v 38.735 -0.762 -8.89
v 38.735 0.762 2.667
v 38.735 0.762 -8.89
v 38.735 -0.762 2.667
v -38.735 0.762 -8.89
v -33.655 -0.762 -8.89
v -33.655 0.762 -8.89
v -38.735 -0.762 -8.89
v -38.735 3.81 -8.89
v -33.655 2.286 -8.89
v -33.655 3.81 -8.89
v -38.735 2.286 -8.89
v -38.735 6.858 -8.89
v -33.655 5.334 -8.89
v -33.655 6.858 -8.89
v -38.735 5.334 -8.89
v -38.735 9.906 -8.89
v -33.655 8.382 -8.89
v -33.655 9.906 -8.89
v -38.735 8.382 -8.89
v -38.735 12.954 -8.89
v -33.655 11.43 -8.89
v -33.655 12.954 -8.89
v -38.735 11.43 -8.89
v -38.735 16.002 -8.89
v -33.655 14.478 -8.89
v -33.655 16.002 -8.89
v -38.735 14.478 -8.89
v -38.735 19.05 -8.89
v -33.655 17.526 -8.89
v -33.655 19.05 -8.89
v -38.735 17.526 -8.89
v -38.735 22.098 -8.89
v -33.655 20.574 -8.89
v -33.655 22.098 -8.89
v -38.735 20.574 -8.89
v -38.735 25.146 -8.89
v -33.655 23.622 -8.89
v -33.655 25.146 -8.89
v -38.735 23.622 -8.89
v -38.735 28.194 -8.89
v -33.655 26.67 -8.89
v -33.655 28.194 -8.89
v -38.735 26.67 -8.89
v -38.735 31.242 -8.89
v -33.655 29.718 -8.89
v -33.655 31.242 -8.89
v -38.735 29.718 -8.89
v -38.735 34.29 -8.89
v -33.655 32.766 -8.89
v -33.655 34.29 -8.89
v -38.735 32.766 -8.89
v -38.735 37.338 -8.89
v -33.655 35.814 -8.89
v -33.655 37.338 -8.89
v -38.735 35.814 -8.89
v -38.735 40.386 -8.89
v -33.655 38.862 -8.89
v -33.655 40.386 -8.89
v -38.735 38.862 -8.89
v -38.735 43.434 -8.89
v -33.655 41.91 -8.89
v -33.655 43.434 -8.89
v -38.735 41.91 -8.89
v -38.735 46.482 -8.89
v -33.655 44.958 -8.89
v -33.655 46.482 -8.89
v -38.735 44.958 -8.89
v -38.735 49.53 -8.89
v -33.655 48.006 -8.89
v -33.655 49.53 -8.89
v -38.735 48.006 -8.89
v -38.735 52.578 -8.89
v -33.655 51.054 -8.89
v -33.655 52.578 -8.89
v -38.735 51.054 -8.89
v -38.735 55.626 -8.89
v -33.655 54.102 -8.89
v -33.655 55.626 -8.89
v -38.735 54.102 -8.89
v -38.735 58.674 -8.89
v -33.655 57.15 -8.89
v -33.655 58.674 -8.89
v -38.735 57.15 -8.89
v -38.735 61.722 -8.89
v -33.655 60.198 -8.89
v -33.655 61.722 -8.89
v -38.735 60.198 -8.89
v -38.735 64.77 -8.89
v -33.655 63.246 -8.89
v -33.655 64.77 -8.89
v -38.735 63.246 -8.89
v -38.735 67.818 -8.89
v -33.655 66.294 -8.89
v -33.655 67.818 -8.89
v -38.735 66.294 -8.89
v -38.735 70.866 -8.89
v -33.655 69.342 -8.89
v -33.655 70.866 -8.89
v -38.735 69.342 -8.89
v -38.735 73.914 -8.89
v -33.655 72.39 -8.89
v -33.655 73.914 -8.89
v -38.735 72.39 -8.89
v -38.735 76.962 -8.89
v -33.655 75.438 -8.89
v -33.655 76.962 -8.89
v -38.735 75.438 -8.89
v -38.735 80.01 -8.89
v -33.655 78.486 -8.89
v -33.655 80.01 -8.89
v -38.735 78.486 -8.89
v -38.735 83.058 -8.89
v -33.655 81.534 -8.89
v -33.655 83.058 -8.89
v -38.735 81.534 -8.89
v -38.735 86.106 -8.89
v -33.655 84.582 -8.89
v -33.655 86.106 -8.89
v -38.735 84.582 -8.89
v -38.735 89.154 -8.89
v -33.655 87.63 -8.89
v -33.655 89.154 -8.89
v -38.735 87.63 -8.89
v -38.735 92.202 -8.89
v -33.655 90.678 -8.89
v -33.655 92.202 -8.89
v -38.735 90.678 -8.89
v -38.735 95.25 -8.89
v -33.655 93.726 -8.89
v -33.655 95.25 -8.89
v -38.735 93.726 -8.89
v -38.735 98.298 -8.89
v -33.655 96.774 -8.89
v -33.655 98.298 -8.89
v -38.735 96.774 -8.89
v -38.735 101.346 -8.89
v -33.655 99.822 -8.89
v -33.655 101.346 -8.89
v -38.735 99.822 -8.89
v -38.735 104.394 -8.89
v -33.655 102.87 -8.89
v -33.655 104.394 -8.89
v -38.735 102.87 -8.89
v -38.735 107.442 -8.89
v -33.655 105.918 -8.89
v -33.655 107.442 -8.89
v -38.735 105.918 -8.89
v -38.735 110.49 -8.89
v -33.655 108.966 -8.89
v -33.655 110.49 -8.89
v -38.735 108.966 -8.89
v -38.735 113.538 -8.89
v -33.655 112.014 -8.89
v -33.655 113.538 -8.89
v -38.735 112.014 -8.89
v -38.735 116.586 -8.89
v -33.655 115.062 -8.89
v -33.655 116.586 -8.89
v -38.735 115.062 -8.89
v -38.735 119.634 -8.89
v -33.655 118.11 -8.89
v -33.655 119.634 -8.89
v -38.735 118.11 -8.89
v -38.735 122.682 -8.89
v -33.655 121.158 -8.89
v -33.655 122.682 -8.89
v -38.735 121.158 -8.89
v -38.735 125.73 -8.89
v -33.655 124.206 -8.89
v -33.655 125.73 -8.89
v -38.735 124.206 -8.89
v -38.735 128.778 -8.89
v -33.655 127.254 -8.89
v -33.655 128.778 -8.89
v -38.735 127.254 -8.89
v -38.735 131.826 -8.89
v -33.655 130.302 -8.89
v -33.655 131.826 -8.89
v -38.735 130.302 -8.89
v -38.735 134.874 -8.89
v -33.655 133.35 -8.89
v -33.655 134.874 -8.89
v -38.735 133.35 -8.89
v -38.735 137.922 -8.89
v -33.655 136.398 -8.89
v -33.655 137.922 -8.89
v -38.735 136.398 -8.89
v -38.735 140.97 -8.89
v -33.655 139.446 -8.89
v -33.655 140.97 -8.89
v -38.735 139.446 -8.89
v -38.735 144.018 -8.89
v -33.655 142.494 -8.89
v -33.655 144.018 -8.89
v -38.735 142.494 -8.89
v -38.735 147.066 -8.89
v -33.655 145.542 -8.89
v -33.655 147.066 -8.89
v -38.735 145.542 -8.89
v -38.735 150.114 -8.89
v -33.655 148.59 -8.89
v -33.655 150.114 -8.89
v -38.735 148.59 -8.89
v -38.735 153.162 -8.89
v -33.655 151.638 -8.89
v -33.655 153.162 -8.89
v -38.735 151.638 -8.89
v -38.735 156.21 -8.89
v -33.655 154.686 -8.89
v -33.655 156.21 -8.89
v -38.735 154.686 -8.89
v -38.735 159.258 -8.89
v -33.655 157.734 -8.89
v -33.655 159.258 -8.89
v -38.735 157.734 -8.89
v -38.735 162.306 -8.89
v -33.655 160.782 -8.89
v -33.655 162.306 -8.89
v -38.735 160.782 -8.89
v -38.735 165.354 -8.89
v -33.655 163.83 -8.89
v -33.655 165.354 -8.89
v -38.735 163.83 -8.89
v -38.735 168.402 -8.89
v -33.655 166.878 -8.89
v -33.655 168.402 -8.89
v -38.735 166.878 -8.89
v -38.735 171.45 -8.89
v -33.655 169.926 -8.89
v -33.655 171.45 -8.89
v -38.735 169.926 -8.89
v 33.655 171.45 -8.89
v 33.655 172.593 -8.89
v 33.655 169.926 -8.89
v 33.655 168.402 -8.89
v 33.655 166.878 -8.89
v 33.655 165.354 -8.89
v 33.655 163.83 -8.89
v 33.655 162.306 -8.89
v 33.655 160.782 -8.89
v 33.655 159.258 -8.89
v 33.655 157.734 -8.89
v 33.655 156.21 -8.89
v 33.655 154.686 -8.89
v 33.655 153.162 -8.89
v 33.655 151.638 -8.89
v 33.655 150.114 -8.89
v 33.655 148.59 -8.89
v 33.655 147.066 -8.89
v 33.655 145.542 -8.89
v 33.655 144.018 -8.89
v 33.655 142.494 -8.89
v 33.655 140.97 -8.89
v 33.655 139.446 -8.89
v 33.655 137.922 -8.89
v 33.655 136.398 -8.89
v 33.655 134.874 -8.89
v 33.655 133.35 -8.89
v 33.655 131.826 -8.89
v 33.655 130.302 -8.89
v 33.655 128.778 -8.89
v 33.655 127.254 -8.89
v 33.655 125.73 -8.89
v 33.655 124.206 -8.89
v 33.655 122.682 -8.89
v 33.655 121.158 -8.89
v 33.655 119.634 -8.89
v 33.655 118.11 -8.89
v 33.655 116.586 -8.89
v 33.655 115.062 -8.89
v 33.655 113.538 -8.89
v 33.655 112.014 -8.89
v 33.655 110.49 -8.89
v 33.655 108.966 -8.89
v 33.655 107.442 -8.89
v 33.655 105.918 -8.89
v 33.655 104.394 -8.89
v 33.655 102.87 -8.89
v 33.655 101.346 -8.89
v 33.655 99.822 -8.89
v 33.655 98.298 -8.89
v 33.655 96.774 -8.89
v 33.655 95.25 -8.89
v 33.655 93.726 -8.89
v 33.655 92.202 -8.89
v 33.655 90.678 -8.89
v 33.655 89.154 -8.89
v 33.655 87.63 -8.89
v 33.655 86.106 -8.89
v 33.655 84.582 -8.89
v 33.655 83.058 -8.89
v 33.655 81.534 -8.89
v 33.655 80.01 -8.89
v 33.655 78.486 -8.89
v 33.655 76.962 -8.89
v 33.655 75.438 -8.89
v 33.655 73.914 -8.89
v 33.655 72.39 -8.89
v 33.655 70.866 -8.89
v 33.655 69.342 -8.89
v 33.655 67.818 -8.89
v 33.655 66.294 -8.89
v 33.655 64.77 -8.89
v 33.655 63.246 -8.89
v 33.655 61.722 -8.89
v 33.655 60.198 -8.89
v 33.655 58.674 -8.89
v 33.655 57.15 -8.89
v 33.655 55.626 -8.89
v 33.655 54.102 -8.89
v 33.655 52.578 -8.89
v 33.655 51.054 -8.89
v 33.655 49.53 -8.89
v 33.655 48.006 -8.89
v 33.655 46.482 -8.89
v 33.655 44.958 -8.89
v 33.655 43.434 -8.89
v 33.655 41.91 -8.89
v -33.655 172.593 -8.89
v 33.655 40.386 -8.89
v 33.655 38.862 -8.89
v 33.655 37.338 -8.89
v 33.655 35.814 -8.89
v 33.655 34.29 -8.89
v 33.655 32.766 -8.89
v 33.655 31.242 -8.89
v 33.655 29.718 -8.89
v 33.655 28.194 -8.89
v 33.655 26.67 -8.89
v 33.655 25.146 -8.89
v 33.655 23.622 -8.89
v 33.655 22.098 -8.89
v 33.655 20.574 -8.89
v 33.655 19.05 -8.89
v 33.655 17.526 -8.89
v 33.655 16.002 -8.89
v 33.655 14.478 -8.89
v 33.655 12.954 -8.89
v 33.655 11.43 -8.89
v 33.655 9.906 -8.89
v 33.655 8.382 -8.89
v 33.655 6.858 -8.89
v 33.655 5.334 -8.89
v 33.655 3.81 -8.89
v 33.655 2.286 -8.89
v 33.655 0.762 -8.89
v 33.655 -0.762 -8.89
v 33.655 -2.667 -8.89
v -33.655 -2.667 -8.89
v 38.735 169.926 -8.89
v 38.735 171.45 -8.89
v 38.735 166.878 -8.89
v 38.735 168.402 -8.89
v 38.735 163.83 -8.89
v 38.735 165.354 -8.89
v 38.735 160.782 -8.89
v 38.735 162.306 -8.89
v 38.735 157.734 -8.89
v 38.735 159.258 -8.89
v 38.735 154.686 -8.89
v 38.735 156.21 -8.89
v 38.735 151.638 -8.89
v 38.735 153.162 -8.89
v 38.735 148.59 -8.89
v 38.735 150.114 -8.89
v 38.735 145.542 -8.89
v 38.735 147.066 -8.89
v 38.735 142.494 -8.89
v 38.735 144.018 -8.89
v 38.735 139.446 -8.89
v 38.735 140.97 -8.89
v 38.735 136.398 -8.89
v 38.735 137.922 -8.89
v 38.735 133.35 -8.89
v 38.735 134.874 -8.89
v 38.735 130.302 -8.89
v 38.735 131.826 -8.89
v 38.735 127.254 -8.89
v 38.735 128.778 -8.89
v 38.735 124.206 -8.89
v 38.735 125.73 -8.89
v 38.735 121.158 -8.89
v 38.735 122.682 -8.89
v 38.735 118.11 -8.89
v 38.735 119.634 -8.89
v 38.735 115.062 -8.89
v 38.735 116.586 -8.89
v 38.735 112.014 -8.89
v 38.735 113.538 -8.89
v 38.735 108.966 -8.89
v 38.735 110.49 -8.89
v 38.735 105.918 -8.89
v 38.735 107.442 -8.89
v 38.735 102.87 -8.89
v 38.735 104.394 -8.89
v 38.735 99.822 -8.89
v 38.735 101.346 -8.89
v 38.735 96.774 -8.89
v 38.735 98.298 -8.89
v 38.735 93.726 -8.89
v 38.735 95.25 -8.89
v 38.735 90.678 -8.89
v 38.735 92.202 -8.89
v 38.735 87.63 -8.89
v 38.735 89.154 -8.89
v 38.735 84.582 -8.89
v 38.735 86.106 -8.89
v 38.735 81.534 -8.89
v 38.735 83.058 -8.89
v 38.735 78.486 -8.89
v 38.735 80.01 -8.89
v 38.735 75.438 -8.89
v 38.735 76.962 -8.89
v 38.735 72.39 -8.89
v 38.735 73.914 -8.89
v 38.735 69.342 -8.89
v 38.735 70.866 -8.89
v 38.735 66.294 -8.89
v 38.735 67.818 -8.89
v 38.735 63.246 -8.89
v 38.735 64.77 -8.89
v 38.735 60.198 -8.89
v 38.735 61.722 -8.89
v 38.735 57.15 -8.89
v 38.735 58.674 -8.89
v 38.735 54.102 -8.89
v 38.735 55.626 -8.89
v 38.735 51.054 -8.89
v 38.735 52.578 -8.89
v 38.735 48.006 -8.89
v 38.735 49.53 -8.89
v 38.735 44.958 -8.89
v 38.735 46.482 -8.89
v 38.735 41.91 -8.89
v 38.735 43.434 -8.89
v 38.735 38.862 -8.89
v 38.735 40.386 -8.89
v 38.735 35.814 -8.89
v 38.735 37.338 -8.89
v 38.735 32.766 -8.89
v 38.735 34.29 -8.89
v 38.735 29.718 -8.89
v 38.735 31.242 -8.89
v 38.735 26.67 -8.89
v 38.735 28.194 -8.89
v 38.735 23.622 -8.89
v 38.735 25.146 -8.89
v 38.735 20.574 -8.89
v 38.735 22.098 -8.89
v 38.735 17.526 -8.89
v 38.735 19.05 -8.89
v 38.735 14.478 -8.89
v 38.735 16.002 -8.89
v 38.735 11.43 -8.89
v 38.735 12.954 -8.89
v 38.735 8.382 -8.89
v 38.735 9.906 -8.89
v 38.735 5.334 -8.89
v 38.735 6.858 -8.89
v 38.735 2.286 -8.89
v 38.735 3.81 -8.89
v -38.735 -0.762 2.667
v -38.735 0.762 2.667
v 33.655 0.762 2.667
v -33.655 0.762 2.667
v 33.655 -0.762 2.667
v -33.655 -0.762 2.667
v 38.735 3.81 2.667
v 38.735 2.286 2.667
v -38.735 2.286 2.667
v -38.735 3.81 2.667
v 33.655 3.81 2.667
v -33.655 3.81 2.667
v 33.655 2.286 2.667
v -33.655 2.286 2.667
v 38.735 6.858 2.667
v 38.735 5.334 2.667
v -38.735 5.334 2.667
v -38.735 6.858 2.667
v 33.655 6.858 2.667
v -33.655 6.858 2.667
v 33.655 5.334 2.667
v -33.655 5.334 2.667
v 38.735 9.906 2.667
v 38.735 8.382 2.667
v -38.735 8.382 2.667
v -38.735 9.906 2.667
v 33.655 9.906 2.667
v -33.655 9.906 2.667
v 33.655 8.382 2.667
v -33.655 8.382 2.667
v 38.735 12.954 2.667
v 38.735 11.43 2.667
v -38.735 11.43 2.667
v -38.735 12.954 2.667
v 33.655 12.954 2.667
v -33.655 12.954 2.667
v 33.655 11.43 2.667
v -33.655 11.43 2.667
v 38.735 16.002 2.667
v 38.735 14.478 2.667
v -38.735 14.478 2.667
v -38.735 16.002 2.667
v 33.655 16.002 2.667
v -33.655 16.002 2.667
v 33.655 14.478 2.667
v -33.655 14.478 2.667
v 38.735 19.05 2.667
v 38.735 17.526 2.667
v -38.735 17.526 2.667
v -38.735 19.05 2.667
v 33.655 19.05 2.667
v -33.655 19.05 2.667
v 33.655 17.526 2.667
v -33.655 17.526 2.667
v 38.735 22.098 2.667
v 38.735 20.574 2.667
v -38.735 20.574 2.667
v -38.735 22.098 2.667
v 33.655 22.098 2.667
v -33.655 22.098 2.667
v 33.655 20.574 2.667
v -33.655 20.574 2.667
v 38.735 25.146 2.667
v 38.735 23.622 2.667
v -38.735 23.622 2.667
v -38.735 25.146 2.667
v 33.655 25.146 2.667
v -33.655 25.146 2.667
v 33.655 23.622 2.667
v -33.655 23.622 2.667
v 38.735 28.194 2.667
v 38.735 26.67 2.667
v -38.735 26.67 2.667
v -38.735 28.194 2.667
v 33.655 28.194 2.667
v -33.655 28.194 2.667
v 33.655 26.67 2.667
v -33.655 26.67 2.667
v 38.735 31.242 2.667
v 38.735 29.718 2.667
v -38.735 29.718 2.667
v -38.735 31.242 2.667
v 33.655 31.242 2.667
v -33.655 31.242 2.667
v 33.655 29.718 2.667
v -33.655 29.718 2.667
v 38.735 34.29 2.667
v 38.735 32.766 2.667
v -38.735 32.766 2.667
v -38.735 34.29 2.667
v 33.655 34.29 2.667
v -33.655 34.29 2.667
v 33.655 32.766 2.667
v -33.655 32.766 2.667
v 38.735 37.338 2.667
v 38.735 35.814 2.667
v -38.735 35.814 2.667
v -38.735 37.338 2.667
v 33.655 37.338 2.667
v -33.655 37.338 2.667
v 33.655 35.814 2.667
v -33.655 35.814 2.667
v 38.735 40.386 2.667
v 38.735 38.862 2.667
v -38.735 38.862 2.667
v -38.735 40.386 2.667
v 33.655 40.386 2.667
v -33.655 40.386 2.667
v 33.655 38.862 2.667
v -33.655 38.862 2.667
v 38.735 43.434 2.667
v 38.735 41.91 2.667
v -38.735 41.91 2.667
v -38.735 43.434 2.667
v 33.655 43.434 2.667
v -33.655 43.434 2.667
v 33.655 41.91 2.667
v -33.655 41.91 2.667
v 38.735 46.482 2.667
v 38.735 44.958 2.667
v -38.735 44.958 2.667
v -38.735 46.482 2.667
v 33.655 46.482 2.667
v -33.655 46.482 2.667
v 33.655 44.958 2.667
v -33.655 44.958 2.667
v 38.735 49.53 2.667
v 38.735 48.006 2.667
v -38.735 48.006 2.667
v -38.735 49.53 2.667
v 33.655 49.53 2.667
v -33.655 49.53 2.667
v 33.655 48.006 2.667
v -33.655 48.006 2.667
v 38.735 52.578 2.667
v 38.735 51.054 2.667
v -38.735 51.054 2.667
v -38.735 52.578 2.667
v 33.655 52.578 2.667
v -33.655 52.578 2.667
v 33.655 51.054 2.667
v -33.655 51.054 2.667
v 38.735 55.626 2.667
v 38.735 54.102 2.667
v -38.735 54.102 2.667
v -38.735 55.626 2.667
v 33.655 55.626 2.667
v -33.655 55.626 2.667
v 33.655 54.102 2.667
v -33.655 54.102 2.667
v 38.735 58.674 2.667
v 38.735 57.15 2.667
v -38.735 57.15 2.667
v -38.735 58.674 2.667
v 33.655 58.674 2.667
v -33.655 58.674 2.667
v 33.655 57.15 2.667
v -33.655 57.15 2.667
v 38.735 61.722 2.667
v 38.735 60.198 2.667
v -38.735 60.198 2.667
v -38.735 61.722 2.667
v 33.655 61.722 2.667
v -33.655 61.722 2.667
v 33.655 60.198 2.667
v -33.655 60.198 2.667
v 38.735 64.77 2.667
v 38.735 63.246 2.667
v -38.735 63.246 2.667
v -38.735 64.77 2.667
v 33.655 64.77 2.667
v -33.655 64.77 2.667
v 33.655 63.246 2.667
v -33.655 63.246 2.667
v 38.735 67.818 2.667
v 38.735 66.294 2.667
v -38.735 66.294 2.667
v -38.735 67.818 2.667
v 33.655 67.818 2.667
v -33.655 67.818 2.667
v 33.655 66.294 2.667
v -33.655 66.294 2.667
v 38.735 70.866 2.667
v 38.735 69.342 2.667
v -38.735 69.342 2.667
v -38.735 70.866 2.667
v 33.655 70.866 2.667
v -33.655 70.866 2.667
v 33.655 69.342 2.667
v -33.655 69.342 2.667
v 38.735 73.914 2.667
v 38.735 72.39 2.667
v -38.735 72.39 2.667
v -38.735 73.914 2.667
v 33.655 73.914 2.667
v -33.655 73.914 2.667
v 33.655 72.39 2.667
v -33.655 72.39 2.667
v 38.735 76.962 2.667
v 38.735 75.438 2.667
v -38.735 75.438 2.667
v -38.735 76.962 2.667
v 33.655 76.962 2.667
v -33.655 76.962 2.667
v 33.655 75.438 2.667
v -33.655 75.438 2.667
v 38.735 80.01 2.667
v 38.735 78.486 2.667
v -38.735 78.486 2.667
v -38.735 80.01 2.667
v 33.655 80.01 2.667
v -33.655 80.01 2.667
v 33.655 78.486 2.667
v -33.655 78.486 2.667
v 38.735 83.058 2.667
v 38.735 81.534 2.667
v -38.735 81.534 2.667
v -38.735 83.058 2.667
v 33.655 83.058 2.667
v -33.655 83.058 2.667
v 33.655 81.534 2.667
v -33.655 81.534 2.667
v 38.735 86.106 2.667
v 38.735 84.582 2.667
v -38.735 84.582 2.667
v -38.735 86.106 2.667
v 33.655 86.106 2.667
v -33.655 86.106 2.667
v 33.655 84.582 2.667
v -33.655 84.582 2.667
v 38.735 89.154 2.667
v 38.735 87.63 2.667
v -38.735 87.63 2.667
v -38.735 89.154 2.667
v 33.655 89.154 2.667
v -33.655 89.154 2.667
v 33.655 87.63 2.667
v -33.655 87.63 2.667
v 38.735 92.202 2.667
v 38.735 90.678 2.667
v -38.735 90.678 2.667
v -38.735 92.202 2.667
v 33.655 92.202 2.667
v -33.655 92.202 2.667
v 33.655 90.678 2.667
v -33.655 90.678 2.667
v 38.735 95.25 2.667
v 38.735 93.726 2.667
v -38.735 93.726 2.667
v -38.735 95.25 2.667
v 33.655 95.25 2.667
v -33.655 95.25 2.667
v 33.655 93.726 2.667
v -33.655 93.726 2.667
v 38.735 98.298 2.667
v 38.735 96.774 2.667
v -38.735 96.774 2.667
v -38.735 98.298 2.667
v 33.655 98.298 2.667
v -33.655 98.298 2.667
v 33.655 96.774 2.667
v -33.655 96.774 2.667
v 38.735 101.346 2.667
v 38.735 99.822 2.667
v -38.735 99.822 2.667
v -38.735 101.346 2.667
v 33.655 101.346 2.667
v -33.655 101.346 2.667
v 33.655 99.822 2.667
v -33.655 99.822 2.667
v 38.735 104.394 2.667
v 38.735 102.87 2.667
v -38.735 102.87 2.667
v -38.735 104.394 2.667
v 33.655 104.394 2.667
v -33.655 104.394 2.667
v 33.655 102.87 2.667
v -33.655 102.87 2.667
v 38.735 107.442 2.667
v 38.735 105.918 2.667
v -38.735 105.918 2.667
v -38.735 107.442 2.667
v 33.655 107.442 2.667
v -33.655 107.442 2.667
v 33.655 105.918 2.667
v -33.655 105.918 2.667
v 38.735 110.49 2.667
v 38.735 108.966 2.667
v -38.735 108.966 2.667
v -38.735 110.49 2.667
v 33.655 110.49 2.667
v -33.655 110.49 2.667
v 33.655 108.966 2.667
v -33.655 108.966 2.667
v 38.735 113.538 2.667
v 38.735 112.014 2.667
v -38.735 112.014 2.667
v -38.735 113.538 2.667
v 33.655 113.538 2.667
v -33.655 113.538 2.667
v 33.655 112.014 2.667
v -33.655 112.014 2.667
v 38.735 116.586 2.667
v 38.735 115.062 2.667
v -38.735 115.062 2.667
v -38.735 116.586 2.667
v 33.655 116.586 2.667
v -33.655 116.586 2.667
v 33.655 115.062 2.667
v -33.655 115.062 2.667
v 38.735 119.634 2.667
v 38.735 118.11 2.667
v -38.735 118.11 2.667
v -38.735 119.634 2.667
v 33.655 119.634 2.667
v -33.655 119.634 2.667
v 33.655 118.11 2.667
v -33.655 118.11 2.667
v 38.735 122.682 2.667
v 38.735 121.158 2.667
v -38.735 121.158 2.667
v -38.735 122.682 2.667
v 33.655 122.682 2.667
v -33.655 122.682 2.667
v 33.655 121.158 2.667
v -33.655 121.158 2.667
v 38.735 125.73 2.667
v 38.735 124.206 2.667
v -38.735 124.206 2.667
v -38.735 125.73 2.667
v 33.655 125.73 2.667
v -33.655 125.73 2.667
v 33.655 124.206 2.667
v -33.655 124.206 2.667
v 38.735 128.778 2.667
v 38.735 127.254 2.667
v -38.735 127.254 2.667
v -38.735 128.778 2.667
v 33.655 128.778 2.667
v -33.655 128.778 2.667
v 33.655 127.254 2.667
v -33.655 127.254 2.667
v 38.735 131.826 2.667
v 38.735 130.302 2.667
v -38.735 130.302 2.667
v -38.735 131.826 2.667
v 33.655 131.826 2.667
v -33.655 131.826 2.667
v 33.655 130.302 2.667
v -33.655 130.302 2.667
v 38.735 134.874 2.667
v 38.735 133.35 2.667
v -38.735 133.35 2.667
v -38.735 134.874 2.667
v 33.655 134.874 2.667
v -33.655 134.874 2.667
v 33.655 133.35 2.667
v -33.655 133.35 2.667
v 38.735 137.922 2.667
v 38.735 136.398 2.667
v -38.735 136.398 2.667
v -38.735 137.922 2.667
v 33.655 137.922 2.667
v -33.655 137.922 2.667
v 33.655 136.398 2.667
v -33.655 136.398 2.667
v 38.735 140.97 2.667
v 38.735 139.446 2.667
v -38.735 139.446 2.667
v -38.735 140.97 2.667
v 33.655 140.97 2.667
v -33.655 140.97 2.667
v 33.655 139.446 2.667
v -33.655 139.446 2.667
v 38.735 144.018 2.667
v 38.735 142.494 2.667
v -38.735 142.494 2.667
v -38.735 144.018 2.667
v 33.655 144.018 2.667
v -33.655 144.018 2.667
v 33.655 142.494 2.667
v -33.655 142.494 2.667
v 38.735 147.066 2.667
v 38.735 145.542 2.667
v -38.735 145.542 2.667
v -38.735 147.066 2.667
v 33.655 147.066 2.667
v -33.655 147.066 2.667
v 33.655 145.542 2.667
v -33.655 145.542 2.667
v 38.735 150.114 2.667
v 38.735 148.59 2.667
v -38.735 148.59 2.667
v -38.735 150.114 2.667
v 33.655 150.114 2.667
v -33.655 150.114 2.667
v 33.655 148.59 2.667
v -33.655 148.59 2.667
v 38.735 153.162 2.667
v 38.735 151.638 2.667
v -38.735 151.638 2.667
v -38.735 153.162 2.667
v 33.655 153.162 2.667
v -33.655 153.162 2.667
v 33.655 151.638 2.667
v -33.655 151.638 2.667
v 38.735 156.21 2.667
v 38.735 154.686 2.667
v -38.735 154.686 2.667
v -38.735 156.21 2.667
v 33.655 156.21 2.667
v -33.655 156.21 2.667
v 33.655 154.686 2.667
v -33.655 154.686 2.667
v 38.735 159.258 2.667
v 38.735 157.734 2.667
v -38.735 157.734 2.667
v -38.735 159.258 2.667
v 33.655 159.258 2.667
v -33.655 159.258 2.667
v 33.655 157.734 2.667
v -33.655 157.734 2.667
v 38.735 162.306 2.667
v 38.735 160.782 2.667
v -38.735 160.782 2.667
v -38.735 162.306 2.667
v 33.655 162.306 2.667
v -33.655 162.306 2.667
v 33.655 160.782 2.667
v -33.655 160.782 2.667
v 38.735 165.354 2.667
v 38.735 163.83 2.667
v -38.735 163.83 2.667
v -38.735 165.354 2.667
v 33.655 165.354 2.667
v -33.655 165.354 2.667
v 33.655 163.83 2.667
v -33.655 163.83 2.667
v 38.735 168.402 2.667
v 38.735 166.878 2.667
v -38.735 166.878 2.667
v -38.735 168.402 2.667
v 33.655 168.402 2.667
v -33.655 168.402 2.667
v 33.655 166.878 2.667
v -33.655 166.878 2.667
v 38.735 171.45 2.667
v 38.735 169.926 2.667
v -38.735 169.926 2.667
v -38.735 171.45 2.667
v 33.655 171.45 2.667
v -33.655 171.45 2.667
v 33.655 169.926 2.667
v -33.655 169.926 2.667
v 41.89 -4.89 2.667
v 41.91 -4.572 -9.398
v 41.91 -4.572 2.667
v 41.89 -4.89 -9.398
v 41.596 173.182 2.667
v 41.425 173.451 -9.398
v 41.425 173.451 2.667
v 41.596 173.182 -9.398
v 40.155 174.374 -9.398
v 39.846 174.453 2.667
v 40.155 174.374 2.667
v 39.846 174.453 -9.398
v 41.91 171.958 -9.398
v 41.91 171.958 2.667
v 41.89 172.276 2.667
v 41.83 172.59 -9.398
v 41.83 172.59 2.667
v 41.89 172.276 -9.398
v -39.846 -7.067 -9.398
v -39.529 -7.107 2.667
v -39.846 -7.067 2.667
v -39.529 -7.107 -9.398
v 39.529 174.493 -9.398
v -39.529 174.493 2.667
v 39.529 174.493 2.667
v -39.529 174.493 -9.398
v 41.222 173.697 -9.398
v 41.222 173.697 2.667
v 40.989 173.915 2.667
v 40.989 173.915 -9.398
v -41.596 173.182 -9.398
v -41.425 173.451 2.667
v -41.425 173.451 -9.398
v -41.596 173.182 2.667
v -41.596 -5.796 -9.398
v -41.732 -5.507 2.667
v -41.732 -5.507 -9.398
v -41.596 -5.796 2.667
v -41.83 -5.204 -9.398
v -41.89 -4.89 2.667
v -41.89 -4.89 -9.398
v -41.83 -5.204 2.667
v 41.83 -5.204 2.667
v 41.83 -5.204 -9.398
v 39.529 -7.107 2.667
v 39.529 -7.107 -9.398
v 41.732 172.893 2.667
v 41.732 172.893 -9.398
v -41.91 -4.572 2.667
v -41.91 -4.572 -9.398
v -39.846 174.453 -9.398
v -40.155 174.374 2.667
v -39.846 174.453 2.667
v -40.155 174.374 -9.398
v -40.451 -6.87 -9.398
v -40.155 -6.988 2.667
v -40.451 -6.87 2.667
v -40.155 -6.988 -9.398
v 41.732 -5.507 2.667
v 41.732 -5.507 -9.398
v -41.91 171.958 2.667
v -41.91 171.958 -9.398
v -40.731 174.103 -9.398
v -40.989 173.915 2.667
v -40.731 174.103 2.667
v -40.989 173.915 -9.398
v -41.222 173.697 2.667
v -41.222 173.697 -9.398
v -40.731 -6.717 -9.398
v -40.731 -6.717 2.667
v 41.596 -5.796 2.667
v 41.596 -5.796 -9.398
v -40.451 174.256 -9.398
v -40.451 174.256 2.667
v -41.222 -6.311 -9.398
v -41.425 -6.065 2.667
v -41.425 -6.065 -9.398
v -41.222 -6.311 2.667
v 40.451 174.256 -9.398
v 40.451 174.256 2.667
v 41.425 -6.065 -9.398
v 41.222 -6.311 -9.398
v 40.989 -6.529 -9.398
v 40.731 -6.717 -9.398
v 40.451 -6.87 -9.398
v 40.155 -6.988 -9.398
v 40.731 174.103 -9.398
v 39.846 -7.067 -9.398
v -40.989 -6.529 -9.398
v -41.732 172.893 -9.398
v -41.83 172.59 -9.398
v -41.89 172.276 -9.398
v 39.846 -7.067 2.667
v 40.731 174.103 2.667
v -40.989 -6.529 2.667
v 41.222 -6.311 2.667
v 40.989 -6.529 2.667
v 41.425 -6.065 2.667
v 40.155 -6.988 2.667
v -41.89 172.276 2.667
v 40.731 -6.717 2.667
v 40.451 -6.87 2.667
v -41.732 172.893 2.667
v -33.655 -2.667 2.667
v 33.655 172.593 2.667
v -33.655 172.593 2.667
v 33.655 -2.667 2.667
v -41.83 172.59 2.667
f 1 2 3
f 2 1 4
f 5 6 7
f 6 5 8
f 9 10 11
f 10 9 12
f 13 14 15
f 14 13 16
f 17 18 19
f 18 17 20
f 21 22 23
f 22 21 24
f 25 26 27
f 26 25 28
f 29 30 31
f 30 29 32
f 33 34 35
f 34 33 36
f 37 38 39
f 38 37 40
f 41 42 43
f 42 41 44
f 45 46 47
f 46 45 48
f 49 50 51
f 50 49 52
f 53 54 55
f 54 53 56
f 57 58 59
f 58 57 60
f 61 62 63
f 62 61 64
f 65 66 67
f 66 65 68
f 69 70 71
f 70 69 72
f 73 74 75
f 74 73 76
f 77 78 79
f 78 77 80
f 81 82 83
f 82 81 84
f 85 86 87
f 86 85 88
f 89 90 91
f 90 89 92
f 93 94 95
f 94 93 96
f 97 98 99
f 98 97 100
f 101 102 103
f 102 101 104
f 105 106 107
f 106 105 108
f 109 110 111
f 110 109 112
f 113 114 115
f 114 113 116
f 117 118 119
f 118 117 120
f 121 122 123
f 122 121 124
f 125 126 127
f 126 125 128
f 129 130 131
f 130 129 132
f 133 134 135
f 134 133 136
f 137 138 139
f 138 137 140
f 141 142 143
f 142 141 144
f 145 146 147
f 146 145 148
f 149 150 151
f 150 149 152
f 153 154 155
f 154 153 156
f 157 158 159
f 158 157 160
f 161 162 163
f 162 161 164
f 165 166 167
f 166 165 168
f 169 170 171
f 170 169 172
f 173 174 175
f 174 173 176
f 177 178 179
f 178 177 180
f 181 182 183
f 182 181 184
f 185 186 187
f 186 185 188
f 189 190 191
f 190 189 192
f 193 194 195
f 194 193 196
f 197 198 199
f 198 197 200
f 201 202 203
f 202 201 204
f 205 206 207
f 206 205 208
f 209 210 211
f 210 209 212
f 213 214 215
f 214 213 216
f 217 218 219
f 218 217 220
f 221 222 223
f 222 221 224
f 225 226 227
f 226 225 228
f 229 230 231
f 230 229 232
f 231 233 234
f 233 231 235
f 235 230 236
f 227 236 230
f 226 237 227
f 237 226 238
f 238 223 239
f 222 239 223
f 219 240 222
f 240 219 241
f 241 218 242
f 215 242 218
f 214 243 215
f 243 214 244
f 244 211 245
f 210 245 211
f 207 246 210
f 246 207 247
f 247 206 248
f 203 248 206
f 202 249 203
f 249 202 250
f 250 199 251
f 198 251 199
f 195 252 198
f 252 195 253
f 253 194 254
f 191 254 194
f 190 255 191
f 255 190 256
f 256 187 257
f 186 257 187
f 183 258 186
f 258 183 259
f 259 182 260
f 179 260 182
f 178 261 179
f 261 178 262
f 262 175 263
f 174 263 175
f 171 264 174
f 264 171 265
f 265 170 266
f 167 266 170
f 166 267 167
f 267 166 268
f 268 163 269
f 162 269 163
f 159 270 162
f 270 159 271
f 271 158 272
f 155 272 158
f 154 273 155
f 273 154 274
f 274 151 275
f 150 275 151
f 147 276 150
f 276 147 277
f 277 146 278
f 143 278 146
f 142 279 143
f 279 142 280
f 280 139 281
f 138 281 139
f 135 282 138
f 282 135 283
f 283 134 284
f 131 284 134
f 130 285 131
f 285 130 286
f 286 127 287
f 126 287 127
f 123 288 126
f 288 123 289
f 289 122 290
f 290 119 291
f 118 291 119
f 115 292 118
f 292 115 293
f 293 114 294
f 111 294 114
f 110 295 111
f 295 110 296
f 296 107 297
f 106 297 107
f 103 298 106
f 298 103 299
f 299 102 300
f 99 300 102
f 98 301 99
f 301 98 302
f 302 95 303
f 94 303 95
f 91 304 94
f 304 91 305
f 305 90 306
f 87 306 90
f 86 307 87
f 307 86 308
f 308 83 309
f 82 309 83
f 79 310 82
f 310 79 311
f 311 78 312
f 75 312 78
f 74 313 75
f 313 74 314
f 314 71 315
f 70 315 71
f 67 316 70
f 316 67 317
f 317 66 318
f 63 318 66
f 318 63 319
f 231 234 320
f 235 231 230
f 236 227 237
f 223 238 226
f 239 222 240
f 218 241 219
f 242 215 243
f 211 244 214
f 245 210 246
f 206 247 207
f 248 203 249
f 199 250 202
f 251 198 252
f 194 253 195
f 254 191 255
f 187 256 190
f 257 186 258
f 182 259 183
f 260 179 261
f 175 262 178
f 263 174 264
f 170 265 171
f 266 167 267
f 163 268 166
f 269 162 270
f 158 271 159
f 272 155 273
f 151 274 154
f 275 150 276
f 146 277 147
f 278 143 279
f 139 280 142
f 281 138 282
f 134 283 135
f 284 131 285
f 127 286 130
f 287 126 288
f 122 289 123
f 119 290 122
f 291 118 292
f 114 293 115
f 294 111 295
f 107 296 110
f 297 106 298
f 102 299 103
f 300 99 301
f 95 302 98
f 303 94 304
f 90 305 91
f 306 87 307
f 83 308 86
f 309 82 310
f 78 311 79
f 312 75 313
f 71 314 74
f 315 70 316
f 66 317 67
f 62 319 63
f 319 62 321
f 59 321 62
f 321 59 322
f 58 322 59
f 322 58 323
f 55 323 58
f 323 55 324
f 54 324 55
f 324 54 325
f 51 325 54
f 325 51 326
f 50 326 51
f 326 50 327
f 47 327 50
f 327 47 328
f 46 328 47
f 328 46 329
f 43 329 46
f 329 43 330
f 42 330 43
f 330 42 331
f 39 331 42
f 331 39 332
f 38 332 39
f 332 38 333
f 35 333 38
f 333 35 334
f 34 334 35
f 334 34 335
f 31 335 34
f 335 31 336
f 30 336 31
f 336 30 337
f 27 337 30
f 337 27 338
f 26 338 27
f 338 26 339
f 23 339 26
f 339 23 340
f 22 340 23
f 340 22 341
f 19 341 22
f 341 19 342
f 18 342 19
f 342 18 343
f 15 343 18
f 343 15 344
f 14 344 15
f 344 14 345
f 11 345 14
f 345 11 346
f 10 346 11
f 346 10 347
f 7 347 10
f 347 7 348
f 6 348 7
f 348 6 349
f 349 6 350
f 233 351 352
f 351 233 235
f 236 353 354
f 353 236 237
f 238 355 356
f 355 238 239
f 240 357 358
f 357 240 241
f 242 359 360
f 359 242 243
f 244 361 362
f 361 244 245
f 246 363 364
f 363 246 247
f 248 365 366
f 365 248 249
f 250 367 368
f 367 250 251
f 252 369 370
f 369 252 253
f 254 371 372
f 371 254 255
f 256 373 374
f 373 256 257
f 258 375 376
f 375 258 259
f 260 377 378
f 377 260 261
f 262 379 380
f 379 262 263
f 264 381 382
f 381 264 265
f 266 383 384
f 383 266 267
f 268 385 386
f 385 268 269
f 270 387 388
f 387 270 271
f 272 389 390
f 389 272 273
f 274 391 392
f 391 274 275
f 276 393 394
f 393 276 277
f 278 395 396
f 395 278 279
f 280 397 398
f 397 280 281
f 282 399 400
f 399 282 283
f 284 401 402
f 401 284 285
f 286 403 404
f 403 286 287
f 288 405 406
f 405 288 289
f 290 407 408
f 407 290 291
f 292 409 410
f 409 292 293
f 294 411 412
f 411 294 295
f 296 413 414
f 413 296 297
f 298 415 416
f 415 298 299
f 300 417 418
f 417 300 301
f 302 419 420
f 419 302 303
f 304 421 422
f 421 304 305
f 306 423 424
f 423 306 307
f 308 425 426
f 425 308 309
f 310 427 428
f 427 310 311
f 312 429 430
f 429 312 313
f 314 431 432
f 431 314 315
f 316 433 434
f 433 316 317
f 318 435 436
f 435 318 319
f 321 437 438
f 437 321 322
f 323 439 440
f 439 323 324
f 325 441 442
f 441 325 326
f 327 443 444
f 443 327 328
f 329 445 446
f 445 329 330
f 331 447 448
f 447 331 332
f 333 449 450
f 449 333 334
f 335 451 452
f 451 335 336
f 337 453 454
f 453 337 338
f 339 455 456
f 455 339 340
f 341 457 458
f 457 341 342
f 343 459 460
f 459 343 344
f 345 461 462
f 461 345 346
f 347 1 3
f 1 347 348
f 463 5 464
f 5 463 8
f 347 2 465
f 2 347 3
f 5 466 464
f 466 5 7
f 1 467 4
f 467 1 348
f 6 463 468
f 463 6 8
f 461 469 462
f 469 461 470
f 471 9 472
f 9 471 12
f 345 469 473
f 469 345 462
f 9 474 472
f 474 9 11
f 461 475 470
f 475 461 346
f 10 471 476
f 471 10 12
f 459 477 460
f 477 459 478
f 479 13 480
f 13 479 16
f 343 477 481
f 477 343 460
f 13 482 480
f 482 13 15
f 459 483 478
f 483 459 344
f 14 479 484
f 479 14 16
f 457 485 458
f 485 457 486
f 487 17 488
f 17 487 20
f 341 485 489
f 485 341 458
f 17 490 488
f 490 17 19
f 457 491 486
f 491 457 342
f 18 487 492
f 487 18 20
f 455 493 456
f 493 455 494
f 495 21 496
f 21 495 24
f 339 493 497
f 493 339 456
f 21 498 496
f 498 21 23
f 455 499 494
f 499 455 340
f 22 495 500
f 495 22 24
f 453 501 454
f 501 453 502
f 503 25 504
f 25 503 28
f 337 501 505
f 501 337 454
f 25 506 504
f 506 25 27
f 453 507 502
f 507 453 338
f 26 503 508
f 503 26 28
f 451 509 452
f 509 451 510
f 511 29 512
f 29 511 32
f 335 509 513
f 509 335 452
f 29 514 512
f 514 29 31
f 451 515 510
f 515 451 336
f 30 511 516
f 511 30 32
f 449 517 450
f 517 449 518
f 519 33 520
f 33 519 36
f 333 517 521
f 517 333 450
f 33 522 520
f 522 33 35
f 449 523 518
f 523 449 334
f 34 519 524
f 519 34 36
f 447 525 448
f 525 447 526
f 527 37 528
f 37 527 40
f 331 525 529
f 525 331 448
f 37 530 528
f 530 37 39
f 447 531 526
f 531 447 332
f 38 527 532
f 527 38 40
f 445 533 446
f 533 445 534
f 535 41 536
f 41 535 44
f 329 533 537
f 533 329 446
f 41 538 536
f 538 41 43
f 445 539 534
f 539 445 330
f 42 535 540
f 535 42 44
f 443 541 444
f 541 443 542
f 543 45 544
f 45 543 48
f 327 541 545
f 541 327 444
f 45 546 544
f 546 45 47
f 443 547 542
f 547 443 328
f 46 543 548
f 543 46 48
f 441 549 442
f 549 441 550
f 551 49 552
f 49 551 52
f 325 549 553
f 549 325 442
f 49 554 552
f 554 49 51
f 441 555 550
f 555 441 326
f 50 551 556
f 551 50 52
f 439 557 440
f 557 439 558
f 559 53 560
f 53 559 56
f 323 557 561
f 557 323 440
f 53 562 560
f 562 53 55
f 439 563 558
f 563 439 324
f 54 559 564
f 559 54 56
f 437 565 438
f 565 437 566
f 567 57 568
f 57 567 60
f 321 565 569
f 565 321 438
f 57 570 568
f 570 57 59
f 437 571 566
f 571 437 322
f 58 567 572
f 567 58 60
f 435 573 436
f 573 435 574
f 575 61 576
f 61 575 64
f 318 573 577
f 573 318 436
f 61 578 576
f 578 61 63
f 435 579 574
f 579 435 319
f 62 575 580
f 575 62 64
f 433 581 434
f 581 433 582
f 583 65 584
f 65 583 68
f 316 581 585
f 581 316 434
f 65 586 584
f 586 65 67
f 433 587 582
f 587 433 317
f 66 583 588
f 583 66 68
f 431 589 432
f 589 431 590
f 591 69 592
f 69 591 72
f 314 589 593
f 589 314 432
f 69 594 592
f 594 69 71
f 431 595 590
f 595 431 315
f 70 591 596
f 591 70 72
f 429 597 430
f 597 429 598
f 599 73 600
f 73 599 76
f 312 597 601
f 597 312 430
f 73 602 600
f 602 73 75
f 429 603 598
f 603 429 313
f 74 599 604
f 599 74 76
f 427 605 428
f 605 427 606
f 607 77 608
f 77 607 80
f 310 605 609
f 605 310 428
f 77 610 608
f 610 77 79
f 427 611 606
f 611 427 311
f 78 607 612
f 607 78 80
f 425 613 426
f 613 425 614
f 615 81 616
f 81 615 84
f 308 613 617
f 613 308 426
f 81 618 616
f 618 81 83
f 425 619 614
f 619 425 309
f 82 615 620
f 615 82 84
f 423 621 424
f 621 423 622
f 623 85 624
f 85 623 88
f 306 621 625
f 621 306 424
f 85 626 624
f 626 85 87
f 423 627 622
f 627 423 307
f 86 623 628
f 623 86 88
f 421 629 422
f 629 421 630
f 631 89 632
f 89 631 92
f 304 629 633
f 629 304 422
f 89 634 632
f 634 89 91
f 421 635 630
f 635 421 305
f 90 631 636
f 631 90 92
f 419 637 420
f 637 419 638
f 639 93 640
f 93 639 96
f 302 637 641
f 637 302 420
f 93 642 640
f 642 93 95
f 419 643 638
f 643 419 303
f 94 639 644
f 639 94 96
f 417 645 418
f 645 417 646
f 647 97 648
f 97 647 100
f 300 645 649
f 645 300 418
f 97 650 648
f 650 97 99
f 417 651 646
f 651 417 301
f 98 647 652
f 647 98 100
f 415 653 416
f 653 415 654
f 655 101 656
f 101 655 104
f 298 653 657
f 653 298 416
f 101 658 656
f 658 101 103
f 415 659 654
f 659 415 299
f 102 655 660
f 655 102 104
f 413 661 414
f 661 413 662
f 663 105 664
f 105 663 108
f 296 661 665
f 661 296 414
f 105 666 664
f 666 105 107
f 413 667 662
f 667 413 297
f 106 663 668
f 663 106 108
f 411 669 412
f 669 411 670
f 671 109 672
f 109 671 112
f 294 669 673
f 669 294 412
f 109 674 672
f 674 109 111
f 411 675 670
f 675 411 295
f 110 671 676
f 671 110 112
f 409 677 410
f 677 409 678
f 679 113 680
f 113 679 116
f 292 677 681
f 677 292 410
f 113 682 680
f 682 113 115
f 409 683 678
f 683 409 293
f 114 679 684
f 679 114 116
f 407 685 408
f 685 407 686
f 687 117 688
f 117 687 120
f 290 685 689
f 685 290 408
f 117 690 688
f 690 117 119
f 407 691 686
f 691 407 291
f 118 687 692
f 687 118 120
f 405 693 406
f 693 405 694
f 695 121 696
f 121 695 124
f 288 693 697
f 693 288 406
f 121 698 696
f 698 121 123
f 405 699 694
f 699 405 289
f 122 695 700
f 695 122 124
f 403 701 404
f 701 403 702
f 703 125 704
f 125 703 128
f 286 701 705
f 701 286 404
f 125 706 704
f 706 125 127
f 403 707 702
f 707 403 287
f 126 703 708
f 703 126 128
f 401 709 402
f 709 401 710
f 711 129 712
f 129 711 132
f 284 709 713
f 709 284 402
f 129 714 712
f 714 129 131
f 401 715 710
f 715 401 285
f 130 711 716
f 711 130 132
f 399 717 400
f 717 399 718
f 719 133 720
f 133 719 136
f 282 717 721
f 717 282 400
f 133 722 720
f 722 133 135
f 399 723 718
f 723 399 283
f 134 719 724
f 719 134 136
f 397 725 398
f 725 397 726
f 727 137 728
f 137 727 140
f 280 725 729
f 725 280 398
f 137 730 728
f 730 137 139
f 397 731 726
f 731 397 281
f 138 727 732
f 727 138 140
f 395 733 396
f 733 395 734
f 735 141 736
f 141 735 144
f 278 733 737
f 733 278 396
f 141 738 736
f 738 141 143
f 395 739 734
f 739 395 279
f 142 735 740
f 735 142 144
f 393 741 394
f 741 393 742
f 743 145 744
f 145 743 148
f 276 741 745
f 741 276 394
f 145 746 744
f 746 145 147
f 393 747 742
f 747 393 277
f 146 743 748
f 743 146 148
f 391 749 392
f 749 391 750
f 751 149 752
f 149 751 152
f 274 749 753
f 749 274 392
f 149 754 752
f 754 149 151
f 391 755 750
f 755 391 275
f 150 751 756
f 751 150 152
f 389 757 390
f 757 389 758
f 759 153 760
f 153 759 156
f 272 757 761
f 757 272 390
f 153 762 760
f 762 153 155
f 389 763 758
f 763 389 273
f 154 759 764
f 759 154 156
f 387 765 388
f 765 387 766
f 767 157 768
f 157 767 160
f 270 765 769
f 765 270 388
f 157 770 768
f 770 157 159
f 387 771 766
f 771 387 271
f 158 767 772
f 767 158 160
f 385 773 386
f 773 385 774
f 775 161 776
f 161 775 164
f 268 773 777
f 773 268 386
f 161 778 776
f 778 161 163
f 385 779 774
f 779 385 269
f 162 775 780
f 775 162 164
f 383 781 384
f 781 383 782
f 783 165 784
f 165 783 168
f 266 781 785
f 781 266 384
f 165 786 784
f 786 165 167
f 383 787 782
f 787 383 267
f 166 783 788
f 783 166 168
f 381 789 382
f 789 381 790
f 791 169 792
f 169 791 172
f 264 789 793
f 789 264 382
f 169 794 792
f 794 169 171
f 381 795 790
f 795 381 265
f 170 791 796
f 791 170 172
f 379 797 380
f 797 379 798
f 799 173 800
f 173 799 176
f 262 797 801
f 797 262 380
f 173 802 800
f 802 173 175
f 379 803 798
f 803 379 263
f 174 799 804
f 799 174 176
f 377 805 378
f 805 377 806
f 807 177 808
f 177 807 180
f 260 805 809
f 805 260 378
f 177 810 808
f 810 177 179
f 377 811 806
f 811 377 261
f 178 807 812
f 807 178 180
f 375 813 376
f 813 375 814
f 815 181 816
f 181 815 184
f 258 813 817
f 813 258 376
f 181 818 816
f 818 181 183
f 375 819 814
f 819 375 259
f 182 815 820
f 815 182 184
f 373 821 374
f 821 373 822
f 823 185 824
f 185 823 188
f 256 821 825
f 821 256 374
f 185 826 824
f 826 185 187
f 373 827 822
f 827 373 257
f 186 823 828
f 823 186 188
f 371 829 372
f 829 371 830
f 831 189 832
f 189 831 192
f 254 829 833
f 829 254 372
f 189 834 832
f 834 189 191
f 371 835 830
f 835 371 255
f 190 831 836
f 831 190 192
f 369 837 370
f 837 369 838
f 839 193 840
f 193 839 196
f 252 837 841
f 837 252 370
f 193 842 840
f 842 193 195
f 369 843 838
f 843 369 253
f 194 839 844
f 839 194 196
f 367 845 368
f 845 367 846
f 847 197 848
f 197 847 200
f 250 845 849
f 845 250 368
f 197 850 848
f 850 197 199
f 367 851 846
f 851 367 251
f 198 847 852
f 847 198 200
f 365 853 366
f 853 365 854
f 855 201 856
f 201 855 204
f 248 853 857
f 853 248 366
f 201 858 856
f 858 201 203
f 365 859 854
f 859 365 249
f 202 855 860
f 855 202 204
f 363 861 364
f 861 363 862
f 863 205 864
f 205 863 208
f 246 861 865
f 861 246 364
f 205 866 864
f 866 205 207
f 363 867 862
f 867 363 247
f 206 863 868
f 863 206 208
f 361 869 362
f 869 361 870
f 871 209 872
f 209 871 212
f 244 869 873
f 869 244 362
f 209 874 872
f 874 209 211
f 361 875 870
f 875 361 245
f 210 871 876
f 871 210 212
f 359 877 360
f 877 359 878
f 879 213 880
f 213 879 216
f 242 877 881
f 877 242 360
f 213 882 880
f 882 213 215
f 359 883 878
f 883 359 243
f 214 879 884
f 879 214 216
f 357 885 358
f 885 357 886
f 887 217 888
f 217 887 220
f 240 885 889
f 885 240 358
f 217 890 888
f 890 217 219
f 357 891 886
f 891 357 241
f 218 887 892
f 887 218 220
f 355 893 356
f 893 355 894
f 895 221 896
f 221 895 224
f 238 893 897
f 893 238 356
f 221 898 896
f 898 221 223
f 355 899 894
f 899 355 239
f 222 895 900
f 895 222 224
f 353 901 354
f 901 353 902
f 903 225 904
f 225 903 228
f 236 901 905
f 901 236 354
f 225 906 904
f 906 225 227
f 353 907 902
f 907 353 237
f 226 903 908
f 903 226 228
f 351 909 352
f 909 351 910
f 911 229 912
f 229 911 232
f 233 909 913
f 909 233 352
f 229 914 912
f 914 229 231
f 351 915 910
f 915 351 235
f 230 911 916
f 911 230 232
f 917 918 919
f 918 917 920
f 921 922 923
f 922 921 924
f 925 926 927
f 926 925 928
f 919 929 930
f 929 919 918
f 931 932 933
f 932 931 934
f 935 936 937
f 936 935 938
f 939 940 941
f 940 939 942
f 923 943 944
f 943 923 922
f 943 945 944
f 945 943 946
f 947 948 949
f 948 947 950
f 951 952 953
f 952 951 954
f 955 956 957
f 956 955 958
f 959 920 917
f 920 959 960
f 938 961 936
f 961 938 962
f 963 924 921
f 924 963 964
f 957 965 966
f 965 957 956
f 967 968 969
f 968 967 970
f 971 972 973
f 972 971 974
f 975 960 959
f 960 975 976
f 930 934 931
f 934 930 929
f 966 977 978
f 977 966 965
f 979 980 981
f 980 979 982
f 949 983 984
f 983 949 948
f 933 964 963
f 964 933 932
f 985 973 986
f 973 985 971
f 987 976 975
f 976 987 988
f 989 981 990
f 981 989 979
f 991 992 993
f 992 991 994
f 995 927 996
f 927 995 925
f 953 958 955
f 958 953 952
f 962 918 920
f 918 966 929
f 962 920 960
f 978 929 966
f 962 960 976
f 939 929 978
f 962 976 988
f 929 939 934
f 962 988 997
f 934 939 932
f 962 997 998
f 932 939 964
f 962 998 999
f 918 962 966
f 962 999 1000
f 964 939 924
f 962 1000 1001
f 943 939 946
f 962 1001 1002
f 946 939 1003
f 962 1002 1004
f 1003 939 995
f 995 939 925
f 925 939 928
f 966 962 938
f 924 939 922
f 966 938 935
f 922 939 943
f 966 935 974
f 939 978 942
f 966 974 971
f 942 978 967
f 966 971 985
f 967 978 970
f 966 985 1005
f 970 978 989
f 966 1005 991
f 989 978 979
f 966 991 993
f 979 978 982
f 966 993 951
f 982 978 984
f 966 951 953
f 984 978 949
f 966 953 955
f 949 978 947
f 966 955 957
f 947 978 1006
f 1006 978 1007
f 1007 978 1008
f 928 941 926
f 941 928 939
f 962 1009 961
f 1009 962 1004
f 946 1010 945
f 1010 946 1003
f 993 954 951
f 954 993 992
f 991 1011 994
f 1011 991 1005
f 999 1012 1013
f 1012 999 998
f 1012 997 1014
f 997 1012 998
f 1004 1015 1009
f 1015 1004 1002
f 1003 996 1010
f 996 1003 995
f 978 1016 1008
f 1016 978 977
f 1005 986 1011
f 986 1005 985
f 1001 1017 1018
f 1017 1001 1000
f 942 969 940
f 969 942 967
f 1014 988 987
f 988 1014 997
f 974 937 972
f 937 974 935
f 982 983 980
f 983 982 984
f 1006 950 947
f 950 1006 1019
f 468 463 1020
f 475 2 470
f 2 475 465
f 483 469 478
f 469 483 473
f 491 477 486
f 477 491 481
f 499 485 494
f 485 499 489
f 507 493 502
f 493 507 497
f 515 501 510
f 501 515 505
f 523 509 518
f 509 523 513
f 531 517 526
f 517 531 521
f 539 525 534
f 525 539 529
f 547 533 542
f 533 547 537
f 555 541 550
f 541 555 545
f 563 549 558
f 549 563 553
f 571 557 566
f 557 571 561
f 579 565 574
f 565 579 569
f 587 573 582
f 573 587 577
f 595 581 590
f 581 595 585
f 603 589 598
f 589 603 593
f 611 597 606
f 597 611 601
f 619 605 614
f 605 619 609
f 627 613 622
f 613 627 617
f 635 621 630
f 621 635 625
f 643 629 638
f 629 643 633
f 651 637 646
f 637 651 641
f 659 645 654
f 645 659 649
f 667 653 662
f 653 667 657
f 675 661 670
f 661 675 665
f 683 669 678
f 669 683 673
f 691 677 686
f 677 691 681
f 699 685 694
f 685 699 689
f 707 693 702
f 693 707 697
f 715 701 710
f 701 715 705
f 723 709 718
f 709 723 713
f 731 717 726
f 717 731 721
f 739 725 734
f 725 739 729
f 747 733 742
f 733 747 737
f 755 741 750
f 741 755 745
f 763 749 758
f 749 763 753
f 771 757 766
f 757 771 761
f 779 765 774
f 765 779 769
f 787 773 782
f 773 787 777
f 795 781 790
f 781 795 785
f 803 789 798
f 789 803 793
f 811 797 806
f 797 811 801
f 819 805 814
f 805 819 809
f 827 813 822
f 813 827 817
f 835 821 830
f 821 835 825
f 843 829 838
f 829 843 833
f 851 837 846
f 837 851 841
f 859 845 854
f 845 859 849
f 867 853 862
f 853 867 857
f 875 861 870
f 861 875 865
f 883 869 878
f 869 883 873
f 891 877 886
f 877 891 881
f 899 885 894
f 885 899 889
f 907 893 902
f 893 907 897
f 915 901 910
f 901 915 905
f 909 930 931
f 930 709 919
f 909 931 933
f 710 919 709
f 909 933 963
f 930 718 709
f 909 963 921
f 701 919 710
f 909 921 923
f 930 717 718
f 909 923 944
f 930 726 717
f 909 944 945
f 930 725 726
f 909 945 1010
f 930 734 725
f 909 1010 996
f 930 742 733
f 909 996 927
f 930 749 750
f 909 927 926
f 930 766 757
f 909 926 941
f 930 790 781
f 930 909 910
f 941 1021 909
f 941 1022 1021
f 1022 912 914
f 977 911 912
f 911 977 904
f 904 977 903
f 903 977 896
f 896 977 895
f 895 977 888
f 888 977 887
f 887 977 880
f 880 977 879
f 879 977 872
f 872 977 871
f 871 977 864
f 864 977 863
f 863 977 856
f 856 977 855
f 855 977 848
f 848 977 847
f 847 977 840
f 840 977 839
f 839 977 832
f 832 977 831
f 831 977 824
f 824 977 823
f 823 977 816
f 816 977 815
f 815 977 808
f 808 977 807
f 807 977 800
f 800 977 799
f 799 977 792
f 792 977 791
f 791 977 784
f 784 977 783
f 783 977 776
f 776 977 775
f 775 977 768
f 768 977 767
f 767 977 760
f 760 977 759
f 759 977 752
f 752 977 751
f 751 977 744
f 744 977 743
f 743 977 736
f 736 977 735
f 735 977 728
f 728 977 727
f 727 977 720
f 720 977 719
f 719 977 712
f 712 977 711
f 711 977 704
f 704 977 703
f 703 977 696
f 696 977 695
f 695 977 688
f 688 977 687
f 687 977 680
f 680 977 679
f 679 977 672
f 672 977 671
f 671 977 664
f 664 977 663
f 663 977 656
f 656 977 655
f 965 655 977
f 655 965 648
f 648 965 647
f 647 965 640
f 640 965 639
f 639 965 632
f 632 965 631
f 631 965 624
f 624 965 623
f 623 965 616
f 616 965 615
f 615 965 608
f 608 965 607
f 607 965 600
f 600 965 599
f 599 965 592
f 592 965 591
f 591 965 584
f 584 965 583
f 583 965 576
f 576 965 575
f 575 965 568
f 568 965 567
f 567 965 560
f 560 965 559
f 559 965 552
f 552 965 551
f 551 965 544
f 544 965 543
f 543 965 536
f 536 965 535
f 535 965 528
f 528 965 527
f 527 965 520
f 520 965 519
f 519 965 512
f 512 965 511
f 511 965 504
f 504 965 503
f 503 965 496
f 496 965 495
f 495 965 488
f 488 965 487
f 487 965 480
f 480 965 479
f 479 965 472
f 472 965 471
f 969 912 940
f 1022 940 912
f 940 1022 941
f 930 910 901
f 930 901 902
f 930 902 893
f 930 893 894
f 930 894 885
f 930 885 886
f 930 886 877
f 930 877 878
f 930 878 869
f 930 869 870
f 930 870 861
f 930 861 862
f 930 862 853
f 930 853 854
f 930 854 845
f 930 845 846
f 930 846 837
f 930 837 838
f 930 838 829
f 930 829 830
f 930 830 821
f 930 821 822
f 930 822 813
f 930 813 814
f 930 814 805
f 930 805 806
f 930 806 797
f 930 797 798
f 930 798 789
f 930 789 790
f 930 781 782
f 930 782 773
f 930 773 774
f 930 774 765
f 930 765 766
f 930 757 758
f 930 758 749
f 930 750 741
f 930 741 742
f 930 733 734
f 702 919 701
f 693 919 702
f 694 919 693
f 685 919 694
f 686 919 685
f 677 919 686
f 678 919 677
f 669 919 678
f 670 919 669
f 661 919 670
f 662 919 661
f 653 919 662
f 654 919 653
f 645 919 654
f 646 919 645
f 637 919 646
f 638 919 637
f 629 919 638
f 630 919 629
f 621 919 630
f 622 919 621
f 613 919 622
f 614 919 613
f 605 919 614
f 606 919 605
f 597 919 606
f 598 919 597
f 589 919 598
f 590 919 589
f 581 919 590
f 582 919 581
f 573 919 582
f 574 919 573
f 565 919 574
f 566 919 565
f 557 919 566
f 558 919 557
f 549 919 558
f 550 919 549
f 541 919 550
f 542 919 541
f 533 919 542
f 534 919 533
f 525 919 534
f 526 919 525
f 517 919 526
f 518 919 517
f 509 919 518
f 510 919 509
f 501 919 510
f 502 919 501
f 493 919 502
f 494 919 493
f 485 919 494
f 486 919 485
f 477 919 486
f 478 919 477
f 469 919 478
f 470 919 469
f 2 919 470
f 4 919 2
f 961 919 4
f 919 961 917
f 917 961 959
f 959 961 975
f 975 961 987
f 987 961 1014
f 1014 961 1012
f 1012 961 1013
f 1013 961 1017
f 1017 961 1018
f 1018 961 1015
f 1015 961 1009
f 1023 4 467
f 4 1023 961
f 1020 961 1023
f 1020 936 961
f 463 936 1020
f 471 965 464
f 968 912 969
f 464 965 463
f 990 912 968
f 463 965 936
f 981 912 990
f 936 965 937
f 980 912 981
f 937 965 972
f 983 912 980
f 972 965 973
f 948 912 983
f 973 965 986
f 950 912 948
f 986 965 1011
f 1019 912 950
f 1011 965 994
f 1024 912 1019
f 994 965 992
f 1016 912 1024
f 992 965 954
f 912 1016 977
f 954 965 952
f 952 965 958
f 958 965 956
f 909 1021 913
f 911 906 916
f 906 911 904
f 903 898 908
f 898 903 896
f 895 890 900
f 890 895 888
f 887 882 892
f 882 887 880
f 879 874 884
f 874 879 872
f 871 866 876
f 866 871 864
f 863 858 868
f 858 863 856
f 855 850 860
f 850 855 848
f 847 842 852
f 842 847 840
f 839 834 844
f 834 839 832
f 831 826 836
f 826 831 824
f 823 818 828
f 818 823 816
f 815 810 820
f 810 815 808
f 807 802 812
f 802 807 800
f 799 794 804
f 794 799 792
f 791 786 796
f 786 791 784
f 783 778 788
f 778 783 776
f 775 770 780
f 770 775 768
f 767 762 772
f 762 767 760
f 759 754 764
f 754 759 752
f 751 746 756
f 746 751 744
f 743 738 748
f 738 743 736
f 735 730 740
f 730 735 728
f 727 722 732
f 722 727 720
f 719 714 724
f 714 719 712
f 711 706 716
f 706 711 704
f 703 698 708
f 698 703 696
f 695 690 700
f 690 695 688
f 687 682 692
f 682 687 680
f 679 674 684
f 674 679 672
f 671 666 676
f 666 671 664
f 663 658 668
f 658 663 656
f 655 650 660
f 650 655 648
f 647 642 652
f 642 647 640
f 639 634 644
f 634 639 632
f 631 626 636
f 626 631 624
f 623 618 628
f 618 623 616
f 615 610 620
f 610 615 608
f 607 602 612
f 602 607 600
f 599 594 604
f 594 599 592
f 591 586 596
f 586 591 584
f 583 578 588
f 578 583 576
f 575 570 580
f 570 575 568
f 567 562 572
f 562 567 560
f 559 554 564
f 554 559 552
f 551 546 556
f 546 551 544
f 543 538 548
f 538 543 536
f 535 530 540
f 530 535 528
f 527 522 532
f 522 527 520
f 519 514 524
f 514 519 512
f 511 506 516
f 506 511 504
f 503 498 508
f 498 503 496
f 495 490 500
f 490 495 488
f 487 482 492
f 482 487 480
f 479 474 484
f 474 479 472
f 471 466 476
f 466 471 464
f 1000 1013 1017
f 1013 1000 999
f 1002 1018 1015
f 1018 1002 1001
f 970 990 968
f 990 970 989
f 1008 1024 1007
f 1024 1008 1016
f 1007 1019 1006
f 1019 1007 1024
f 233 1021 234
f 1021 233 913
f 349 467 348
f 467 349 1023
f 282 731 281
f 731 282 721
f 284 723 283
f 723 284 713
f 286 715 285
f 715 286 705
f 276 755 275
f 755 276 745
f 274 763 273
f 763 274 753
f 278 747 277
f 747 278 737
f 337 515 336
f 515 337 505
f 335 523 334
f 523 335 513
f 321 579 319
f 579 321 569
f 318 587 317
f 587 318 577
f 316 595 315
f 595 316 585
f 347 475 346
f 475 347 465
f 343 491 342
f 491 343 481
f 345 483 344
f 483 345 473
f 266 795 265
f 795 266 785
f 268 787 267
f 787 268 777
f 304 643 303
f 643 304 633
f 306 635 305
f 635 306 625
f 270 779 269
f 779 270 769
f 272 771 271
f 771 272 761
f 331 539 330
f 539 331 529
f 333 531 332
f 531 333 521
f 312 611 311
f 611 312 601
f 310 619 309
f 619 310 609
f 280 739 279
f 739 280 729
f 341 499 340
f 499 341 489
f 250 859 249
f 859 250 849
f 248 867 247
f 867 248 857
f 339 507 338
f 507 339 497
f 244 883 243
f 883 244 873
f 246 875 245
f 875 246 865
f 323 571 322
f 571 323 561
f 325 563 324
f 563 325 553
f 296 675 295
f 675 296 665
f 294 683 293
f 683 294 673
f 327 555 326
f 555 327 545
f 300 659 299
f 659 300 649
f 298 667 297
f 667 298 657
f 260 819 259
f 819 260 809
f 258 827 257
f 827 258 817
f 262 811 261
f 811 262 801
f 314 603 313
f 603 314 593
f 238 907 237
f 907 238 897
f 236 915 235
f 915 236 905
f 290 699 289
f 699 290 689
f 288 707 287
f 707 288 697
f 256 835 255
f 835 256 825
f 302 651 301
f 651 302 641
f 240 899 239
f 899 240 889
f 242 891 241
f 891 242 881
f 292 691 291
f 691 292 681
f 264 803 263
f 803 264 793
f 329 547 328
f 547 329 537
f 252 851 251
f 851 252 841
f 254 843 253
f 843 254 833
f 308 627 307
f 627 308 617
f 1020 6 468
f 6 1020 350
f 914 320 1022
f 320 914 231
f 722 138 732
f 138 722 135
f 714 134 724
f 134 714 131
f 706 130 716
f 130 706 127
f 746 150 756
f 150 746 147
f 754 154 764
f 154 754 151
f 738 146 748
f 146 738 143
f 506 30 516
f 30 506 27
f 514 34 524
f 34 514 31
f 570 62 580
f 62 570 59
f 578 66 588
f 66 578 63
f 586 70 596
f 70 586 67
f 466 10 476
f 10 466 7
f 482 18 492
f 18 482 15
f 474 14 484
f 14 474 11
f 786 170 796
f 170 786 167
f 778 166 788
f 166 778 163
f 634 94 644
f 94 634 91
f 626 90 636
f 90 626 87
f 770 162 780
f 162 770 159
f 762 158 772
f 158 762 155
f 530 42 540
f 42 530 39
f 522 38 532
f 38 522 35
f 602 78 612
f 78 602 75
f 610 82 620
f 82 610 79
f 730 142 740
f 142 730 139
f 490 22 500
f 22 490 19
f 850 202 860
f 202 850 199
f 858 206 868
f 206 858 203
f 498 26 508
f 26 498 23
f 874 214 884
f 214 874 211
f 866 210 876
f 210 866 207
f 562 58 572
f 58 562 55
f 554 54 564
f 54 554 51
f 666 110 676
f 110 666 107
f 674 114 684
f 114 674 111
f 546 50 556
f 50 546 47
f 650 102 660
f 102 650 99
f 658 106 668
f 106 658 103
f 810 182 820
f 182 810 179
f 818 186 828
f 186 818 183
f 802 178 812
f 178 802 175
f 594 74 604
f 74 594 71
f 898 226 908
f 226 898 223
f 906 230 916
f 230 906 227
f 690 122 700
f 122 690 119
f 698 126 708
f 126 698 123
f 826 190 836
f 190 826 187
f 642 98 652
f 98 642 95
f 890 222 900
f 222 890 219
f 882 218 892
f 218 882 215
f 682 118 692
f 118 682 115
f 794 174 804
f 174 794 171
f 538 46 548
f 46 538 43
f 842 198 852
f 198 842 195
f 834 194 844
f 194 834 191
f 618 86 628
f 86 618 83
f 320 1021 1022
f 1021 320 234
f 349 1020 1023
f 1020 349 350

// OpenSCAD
$fn=50;

pw = 25.4 * 3.05;
pt = 25.4 * .06;
ph = 25.4 * .7;
pg = 25.4 * .12;


b1w = 25.4 * 2.65;
b1h = ph;
b1d = pg * 57 + pt;


b2w = 25.4 * 3.3;
b2h = ph * .75;
b2d = 25.4 * 7.15;
b2r = 2.54;

echo(b2d);

difference() {
    translate([0, b2d/2-pt/2-25.4/4, -b2h*.3]) {
        minkowski() {
            cube([b2w-b2r*2, b2d-b2r*2, b2h-b2r], true);
            cylinder(r=b2r,h=b2r/2);
        }
    }

    {
        for(i = [0:pg:pg*56]) {
            translate([0, i, 0]) {
                cube([pw, pt, ph], true);
            }
        }
        translate([0, b1d/2 - pt*.75 - pg/2, 0]) {
            cube([b1w, b1d, b1h], true);
        }
     }
}
